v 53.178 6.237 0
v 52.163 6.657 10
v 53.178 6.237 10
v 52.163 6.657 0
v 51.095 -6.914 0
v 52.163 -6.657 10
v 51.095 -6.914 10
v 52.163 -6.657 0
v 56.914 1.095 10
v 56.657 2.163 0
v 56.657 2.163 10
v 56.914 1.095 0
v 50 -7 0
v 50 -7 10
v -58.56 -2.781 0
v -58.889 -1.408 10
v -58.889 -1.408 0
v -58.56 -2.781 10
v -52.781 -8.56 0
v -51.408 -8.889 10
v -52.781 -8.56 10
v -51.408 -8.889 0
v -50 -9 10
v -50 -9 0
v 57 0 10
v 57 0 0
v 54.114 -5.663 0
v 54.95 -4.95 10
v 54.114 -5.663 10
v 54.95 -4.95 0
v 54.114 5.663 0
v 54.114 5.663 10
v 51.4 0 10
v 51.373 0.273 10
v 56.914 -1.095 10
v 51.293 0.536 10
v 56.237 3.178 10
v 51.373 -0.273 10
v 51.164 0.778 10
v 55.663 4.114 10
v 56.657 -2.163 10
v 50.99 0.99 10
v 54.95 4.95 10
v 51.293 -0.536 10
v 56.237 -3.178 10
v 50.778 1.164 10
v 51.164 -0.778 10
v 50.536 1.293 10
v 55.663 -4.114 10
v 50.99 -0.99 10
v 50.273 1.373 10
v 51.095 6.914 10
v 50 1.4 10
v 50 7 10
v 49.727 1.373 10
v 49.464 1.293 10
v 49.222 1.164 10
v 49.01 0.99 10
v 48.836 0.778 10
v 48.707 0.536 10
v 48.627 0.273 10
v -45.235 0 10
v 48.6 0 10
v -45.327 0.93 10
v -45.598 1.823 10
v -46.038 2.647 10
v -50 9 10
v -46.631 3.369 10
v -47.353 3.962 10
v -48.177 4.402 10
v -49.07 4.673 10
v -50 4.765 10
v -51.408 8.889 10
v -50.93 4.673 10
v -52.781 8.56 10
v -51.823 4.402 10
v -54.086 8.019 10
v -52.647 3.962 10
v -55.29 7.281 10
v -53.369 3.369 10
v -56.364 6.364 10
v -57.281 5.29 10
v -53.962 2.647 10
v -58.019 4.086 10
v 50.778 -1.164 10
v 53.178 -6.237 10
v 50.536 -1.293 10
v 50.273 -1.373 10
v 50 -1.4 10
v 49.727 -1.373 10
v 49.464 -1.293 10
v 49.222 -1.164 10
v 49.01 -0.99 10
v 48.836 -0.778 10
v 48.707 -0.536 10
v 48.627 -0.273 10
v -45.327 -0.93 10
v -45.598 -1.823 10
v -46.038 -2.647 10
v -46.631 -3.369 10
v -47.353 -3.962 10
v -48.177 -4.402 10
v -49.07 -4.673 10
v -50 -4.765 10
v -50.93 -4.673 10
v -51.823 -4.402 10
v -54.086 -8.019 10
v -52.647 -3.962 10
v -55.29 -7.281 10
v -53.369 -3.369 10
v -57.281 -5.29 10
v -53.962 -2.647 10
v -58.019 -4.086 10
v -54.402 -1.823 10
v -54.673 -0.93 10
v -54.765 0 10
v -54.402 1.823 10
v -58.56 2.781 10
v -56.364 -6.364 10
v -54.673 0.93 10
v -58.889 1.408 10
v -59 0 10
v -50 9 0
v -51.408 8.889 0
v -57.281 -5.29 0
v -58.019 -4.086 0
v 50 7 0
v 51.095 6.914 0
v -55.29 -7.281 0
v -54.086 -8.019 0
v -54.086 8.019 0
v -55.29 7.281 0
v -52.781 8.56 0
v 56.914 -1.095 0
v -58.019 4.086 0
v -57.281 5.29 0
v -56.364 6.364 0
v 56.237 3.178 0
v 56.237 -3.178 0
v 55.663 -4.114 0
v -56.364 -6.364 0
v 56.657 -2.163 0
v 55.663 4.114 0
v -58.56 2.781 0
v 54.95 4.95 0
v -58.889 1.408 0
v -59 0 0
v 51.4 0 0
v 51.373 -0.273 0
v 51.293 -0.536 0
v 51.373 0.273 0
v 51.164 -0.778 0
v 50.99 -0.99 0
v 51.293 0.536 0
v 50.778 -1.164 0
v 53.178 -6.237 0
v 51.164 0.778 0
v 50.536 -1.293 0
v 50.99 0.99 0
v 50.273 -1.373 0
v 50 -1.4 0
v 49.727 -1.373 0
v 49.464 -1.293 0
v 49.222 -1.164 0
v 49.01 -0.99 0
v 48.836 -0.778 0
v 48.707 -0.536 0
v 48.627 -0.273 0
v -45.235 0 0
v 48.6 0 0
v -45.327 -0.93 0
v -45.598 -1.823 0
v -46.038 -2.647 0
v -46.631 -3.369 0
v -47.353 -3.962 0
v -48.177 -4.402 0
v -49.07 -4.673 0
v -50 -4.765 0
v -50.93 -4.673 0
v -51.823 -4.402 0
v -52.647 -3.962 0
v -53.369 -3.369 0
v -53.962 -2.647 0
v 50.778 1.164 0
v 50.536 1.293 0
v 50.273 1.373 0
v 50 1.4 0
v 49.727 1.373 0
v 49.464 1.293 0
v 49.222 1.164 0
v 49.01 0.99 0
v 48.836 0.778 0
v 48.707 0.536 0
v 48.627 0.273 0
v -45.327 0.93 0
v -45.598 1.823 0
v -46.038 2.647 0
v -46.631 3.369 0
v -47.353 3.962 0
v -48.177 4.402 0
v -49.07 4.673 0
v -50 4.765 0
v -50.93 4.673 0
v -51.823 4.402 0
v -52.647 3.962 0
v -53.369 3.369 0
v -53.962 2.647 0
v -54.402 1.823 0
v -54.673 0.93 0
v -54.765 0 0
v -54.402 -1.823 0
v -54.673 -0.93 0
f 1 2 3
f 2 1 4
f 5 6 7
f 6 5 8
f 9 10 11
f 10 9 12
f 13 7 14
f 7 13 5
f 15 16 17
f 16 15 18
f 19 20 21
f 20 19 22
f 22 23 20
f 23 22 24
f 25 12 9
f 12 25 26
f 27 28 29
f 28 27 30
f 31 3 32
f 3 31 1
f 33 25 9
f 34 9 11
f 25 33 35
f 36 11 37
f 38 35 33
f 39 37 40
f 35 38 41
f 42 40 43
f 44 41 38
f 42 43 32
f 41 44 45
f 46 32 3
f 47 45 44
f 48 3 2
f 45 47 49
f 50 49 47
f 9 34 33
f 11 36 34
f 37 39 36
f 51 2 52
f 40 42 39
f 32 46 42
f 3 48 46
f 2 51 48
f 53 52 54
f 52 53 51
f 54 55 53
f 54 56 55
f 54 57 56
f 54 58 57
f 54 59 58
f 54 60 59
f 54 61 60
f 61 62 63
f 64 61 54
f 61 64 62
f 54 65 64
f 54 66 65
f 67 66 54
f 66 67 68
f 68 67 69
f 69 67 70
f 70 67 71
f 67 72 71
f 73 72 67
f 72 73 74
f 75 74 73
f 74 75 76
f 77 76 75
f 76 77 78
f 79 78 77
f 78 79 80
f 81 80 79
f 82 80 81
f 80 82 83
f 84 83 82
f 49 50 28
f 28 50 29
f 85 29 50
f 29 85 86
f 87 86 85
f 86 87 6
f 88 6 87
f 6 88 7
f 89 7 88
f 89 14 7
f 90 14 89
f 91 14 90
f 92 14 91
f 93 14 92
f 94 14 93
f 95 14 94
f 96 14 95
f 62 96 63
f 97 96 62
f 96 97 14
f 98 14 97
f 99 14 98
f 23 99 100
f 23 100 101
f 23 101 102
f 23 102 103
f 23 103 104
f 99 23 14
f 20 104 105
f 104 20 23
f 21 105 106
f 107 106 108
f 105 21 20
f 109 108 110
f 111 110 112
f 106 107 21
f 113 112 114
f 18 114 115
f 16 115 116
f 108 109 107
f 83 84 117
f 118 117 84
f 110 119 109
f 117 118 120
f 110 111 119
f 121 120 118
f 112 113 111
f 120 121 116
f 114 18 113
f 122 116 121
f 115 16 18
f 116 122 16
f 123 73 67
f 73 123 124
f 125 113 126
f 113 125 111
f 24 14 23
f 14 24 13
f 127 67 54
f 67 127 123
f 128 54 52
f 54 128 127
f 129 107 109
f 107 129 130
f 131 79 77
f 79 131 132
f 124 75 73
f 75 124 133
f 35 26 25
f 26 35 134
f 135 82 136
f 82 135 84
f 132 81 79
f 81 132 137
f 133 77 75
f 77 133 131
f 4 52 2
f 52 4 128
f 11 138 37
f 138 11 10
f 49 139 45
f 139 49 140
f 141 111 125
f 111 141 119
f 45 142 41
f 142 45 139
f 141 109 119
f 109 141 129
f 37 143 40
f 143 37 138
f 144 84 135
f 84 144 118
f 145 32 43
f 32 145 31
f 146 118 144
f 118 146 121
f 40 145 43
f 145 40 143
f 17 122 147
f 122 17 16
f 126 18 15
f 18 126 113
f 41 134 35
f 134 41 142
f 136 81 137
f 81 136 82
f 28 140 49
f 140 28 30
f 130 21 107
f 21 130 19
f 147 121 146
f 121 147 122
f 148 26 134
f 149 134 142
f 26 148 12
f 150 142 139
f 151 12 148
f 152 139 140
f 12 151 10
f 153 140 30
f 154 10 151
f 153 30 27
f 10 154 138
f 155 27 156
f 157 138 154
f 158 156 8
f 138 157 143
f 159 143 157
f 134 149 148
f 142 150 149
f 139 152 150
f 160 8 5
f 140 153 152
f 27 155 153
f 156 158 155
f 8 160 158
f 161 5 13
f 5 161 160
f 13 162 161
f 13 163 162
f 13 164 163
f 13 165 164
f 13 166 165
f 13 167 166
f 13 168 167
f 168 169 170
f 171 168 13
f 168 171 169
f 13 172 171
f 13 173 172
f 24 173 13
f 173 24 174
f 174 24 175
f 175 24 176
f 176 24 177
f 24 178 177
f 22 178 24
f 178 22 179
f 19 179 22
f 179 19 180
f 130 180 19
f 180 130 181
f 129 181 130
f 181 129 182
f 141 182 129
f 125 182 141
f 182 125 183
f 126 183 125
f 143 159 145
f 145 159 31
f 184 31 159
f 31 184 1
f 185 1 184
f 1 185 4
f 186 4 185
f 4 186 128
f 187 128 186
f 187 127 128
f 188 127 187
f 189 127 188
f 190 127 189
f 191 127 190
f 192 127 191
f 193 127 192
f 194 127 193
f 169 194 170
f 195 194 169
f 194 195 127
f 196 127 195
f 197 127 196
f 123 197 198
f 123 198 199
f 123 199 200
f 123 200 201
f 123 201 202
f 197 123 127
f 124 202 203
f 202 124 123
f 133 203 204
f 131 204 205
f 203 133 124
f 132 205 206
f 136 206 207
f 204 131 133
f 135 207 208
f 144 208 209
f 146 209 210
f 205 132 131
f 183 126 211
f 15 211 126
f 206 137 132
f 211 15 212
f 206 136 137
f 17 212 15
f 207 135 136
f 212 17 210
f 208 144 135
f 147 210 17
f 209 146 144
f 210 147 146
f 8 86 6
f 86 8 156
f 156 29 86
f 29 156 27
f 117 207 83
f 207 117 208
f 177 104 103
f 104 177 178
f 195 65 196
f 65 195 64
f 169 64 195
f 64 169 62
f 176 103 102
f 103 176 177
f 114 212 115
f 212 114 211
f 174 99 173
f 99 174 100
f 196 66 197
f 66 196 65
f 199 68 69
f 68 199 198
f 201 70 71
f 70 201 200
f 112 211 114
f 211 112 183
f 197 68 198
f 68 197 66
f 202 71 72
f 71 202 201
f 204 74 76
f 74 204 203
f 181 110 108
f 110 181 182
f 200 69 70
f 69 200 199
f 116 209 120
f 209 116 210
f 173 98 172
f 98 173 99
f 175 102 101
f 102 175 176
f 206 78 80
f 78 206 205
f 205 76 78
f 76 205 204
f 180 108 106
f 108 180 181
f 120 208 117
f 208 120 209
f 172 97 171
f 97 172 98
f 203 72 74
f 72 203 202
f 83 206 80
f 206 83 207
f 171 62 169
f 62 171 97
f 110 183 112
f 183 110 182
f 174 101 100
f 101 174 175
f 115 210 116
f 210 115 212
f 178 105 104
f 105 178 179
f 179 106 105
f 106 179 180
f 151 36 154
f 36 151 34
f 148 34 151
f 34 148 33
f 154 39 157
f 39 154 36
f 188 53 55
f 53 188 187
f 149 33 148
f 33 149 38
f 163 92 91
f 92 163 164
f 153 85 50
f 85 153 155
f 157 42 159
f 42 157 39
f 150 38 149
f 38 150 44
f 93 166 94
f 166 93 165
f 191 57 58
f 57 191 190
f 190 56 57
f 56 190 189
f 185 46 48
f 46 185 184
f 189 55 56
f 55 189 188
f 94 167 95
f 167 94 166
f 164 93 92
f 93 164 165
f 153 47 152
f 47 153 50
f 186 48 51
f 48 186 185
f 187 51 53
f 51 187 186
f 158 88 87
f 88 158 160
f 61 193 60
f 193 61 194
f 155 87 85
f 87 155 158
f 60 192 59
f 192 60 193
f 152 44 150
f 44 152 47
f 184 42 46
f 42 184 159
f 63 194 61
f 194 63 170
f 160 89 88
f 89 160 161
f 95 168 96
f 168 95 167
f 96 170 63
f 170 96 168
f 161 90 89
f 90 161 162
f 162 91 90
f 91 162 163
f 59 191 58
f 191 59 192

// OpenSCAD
$fn = 32;

// ----------------------------------------------------------------------
// Lever: 100 mm between the bosses, 10 mm thick, smooth outline
// ----------------------------------------------------------------------

// --- parameters (mm) ---
lever_l = 100;            // distance between the boss centres
boss_a = 18;              // first boss diameter
boss_b = 14;              // second boss diameter
bore_a = 9.53;            // first bore
bore_b = 2.8;             // second bore
lever_t = 10;             // lever thickness

lever_profile = [[-59, 0], [-58.889, -1.408], [-58.56, -2.781], [-58.019, -4.086], [-57.281, -5.29], [-56.364, -6.364], [-55.29, -7.281], [-54.086, -8.019], [-52.781, -8.56], [-51.408, -8.889], [-50, -9], [50, -7], [51.095, -6.914], [52.163, -6.657], [53.178, -6.237], [54.114, -5.663], [54.95, -4.95], [55.663, -4.114], [56.237, -3.178], [56.657, -2.163], [56.914, -1.095], [57, 0], [56.914, 1.095], [56.657, 2.163], [56.237, 3.178], [55.663, 4.114], [54.95, 4.95], [54.114, 5.663], [53.178, 6.237], [52.163, 6.657], [51.095, 6.914], [50, 7], [-50, 9], [-51.408, 8.889], [-52.781, 8.56], [-54.086, 8.019], [-55.29, 7.281], [-56.364, 6.364], [-57.281, 5.29], [-58.019, 4.086], [-58.56, 2.781], [-58.889, 1.408]];

difference() {
  linear_extrude(height = lever_t) polygon(lever_profile);
  translate([-50, 0, -2.5]) cylinder(h = lever_t + 5, d = bore_a);
  translate([50, 0, -2.5]) cylinder(h = lever_t + 5, d = bore_b);
}
